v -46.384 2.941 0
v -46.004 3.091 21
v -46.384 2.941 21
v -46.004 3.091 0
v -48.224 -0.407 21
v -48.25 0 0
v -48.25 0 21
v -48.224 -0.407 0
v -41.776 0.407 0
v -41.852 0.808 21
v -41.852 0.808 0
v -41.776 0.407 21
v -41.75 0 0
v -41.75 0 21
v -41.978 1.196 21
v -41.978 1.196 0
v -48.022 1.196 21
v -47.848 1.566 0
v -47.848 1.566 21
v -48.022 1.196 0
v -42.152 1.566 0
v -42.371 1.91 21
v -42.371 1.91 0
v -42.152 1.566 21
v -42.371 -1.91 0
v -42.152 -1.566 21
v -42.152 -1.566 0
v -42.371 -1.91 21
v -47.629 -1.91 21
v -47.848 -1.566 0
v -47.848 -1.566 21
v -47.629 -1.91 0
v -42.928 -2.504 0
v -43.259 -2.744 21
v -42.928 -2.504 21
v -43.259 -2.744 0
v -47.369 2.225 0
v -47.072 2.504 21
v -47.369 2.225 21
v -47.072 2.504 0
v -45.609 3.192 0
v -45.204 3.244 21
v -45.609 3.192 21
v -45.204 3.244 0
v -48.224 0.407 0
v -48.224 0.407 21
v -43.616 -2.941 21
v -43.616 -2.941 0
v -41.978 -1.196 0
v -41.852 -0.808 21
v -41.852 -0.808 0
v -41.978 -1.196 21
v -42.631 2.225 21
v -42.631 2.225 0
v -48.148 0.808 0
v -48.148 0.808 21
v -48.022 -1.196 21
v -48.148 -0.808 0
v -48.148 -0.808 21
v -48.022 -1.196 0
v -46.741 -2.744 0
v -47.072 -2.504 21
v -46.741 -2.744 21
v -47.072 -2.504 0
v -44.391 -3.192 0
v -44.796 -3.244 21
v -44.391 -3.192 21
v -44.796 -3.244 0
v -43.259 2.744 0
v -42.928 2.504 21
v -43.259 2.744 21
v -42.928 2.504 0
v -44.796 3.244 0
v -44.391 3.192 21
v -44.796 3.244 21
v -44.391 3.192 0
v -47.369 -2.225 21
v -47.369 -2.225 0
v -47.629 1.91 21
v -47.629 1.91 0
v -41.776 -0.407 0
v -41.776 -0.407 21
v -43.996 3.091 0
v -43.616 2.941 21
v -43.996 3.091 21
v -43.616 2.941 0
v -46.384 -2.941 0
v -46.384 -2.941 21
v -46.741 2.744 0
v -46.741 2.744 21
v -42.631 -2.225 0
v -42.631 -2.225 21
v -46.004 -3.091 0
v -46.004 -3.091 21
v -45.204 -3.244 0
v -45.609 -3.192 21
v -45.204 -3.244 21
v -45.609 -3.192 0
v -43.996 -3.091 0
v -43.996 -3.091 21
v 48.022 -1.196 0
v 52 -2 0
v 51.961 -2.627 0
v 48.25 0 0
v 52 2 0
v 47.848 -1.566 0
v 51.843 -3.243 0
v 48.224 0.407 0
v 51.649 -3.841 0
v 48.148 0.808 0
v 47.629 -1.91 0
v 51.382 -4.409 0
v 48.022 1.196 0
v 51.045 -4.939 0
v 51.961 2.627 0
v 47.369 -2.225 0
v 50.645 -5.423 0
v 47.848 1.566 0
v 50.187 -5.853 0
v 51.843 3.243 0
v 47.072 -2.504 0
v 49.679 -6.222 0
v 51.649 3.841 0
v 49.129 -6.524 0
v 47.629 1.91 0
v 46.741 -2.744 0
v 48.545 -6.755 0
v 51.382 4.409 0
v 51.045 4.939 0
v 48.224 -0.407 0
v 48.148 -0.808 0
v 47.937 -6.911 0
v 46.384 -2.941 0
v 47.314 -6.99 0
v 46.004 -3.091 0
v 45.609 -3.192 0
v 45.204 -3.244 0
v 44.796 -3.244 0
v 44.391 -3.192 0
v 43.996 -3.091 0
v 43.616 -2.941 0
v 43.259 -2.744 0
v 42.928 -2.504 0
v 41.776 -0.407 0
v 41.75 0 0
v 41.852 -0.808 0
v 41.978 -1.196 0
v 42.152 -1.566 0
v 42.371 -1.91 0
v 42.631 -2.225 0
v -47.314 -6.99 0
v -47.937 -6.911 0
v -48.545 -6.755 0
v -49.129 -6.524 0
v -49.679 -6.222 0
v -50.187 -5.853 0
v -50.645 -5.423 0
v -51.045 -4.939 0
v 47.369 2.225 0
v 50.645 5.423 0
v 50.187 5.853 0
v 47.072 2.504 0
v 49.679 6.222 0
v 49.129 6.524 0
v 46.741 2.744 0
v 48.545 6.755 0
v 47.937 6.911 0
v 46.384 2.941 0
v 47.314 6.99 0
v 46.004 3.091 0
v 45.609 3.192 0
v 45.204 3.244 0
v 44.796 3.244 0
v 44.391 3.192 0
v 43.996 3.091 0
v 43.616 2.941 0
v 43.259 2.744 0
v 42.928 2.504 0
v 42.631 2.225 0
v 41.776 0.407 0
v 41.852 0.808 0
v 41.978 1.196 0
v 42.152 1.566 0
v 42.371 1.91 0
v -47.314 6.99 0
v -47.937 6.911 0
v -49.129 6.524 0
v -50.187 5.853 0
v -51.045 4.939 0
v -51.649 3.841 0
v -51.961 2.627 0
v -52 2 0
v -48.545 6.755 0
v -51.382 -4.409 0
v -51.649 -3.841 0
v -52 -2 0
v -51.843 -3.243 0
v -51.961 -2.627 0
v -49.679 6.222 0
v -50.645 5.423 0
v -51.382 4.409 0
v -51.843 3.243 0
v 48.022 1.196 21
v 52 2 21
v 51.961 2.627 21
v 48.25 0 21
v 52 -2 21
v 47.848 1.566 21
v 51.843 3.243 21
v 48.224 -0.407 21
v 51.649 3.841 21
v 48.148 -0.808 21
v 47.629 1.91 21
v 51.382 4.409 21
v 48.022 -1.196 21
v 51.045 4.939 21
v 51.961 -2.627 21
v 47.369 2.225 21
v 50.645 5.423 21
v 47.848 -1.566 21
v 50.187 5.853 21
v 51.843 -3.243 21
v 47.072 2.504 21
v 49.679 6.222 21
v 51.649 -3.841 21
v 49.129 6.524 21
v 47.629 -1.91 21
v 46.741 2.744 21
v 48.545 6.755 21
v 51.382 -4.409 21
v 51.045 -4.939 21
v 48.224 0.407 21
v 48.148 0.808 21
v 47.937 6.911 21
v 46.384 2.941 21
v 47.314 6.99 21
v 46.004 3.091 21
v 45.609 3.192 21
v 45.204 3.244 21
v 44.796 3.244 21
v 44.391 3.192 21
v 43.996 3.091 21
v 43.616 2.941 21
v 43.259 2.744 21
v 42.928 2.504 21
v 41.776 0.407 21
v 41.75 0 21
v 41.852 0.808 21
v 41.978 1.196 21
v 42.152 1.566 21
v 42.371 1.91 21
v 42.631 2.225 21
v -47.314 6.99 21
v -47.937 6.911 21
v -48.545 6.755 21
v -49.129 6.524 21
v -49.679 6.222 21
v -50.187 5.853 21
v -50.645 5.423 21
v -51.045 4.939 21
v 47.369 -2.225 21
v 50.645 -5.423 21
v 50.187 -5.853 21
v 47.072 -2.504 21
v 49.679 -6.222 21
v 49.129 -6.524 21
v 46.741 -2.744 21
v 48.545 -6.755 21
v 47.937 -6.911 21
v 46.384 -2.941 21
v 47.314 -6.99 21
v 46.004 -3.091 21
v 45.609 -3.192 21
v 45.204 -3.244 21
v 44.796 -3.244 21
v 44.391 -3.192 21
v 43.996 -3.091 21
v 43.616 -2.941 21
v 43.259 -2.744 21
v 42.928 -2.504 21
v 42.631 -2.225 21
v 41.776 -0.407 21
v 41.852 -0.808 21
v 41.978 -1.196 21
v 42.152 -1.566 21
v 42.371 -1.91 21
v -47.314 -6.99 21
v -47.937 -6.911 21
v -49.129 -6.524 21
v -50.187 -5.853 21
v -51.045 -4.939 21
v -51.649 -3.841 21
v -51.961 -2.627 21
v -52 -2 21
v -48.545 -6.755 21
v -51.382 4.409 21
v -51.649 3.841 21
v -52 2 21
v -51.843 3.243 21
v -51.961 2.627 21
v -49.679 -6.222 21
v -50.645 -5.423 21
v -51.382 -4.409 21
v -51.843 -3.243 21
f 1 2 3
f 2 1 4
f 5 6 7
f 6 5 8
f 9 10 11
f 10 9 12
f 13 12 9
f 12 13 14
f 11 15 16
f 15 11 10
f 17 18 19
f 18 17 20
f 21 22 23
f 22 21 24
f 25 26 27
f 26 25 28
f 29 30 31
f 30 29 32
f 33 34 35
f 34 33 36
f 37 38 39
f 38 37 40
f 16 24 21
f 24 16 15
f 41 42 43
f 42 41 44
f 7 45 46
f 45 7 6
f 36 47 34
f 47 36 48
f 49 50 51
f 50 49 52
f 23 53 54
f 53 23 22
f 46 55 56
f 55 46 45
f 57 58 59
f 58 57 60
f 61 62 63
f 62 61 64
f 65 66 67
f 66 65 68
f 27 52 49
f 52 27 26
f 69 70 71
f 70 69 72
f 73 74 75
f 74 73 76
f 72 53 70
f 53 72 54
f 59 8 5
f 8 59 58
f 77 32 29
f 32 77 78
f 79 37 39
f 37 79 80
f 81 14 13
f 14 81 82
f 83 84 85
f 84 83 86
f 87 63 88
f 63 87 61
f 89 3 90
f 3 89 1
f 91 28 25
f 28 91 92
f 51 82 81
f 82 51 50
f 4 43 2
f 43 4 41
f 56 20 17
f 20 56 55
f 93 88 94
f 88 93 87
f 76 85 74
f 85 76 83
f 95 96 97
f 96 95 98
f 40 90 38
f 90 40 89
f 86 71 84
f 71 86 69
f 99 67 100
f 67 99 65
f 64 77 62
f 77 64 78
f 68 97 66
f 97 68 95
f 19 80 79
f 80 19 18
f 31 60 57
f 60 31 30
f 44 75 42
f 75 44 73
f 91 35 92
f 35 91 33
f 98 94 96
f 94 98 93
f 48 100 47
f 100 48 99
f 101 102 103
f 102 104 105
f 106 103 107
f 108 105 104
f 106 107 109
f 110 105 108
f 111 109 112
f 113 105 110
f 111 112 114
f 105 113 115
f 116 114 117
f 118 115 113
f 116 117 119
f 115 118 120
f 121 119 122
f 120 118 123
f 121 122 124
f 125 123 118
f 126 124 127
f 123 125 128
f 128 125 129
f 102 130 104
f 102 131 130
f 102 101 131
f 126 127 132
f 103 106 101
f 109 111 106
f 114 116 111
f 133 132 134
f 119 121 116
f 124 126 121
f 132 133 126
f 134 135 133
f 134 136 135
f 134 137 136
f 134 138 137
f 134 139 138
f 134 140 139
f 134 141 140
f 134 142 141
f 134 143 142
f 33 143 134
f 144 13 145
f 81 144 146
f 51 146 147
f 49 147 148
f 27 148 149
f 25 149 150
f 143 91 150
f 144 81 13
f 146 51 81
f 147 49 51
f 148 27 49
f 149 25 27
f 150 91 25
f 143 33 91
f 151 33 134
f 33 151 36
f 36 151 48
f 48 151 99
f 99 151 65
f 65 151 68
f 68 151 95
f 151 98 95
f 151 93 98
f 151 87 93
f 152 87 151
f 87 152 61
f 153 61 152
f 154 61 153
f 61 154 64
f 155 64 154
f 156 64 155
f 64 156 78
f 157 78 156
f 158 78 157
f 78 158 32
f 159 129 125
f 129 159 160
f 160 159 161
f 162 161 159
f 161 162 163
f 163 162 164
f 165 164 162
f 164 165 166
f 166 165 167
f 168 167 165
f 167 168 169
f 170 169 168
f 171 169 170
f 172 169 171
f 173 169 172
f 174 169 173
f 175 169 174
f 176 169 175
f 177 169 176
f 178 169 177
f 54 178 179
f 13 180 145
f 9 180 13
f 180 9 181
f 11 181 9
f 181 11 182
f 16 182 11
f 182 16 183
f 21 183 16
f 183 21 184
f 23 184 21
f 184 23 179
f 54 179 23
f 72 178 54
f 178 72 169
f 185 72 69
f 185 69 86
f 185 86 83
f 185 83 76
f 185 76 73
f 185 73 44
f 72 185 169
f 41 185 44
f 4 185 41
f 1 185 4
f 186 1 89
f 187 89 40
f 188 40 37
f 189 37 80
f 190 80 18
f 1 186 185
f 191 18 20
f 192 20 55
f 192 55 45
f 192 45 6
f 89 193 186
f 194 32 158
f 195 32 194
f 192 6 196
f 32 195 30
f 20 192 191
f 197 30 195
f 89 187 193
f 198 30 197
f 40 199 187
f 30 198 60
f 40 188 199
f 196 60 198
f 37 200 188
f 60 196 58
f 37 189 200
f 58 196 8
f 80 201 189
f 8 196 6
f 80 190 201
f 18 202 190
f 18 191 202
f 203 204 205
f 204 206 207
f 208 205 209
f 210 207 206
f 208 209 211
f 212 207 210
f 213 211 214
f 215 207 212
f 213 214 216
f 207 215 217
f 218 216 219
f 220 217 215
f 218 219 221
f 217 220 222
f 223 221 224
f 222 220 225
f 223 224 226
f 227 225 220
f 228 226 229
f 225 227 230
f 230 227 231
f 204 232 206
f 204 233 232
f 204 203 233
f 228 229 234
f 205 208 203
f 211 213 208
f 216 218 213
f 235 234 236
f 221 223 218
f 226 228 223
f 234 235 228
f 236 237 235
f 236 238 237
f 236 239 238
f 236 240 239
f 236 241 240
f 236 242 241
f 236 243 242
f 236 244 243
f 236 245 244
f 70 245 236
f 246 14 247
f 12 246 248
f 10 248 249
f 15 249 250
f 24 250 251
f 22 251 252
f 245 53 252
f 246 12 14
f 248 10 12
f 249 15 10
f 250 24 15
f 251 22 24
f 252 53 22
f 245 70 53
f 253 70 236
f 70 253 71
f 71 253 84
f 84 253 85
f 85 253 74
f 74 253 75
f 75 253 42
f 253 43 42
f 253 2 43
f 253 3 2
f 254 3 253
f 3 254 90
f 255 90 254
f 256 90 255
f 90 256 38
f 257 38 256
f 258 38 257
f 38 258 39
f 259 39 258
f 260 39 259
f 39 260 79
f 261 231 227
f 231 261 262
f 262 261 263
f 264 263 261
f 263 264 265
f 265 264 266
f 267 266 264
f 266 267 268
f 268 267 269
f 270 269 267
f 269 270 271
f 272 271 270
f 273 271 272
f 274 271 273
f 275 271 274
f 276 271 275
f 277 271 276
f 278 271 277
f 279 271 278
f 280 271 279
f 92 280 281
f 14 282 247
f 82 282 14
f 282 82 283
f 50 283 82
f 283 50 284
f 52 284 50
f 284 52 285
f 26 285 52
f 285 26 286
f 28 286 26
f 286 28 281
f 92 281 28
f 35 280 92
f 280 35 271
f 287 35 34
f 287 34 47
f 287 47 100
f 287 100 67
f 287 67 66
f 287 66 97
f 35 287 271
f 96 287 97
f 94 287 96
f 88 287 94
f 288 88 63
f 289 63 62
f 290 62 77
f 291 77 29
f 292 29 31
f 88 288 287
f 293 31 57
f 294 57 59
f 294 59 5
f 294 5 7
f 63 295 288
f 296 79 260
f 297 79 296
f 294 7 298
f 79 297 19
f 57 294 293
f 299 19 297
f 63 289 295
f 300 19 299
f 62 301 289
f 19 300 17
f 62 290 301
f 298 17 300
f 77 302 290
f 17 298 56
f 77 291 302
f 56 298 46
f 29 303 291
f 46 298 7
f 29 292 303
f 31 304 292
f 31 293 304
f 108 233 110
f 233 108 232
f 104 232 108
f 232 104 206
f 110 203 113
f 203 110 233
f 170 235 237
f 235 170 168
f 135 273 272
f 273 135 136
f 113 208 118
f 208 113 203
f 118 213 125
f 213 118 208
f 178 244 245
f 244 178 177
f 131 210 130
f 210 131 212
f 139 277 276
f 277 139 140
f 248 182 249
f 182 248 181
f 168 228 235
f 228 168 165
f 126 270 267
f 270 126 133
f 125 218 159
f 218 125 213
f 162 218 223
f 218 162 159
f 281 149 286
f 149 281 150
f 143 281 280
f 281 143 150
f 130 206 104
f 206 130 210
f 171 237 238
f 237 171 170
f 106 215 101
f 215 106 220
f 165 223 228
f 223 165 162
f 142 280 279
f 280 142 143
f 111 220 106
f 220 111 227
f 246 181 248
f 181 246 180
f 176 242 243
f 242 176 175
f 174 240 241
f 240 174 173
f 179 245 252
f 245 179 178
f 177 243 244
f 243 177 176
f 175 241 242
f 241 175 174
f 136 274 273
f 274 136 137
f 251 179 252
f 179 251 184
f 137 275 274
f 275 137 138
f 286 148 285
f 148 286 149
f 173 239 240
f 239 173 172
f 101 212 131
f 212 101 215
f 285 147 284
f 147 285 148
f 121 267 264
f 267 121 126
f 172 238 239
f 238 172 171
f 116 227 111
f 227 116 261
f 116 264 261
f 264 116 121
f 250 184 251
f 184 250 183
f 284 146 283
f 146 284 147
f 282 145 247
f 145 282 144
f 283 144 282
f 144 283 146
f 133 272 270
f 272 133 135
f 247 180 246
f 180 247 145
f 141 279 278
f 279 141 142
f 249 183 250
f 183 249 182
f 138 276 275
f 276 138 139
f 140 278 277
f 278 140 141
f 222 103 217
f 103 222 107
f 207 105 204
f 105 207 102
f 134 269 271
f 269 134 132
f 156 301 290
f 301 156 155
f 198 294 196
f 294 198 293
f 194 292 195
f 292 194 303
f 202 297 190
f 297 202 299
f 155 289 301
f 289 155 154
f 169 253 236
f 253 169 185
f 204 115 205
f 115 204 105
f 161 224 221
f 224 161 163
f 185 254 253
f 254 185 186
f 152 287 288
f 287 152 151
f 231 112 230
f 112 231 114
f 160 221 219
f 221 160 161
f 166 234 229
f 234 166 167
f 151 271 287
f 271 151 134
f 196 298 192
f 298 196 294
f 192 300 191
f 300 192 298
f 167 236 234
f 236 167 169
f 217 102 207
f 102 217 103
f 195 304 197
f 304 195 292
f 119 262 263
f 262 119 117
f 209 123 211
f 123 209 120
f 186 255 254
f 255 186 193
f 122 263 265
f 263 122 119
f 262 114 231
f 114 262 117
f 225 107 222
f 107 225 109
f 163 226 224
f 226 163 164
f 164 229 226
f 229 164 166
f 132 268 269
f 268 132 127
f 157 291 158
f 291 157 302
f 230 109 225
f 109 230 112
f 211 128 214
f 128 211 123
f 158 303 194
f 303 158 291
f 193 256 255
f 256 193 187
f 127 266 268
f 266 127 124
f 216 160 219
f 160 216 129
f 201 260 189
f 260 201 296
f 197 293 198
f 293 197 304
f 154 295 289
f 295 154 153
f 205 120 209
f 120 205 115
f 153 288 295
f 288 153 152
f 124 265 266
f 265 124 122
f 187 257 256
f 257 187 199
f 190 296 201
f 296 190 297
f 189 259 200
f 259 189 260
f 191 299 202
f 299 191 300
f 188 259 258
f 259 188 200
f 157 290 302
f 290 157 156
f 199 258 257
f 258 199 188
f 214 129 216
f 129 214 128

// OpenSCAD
$fn = 50;


difference() {
	union() {
		hull() {
			translate(v = [-47.0000000000, 2.0000000000, 0]) {
				cylinder(h = 21, r = 5);
			}
			translate(v = [47.0000000000, 2.0000000000, 0]) {
				cylinder(h = 21, r = 5);
			}
			translate(v = [-47.0000000000, -2.0000000000, 0]) {
				cylinder(h = 21, r = 5);
			}
			translate(v = [47.0000000000, -2.0000000000, 0]) {
				cylinder(h = 21, r = 5);
			}
		}
	}
	union() {
		translate(v = [-45.0000000000, 0.0000000000, 0]) {
			cylinder(h = 21, r = 3.2500000000);
		}
		translate(v = [45.0000000000, 0.0000000000, 0]) {
			cylinder(h = 21, r = 3.2500000000);
		}
		translate(v = [-45.0000000000, 0.0000000000, 0]) {
			cylinder(h = 21, r = 1.8000000000);
		}
		translate(v = [45.0000000000, 0.0000000000, 0]) {
			cylinder(h = 21, r = 1.8000000000);
		}
		translate(v = [-45.0000000000, 0.0000000000, 0]) {
			cylinder(h = 21, r = 1.8000000000);
		}
		translate(v = [45.0000000000, 0.0000000000, 0]) {
			cylinder(h = 21, r = 1.8000000000);
		}
		translate(v = [-45.0000000000, 0.0000000000, 0]) {
			cylinder(h = 21, r = 1.8000000000);
		}
		translate(v = [45.0000000000, 0.0000000000, 0]) {
			cylinder(h = 21, r = 1.8000000000);
		}
	}
}
